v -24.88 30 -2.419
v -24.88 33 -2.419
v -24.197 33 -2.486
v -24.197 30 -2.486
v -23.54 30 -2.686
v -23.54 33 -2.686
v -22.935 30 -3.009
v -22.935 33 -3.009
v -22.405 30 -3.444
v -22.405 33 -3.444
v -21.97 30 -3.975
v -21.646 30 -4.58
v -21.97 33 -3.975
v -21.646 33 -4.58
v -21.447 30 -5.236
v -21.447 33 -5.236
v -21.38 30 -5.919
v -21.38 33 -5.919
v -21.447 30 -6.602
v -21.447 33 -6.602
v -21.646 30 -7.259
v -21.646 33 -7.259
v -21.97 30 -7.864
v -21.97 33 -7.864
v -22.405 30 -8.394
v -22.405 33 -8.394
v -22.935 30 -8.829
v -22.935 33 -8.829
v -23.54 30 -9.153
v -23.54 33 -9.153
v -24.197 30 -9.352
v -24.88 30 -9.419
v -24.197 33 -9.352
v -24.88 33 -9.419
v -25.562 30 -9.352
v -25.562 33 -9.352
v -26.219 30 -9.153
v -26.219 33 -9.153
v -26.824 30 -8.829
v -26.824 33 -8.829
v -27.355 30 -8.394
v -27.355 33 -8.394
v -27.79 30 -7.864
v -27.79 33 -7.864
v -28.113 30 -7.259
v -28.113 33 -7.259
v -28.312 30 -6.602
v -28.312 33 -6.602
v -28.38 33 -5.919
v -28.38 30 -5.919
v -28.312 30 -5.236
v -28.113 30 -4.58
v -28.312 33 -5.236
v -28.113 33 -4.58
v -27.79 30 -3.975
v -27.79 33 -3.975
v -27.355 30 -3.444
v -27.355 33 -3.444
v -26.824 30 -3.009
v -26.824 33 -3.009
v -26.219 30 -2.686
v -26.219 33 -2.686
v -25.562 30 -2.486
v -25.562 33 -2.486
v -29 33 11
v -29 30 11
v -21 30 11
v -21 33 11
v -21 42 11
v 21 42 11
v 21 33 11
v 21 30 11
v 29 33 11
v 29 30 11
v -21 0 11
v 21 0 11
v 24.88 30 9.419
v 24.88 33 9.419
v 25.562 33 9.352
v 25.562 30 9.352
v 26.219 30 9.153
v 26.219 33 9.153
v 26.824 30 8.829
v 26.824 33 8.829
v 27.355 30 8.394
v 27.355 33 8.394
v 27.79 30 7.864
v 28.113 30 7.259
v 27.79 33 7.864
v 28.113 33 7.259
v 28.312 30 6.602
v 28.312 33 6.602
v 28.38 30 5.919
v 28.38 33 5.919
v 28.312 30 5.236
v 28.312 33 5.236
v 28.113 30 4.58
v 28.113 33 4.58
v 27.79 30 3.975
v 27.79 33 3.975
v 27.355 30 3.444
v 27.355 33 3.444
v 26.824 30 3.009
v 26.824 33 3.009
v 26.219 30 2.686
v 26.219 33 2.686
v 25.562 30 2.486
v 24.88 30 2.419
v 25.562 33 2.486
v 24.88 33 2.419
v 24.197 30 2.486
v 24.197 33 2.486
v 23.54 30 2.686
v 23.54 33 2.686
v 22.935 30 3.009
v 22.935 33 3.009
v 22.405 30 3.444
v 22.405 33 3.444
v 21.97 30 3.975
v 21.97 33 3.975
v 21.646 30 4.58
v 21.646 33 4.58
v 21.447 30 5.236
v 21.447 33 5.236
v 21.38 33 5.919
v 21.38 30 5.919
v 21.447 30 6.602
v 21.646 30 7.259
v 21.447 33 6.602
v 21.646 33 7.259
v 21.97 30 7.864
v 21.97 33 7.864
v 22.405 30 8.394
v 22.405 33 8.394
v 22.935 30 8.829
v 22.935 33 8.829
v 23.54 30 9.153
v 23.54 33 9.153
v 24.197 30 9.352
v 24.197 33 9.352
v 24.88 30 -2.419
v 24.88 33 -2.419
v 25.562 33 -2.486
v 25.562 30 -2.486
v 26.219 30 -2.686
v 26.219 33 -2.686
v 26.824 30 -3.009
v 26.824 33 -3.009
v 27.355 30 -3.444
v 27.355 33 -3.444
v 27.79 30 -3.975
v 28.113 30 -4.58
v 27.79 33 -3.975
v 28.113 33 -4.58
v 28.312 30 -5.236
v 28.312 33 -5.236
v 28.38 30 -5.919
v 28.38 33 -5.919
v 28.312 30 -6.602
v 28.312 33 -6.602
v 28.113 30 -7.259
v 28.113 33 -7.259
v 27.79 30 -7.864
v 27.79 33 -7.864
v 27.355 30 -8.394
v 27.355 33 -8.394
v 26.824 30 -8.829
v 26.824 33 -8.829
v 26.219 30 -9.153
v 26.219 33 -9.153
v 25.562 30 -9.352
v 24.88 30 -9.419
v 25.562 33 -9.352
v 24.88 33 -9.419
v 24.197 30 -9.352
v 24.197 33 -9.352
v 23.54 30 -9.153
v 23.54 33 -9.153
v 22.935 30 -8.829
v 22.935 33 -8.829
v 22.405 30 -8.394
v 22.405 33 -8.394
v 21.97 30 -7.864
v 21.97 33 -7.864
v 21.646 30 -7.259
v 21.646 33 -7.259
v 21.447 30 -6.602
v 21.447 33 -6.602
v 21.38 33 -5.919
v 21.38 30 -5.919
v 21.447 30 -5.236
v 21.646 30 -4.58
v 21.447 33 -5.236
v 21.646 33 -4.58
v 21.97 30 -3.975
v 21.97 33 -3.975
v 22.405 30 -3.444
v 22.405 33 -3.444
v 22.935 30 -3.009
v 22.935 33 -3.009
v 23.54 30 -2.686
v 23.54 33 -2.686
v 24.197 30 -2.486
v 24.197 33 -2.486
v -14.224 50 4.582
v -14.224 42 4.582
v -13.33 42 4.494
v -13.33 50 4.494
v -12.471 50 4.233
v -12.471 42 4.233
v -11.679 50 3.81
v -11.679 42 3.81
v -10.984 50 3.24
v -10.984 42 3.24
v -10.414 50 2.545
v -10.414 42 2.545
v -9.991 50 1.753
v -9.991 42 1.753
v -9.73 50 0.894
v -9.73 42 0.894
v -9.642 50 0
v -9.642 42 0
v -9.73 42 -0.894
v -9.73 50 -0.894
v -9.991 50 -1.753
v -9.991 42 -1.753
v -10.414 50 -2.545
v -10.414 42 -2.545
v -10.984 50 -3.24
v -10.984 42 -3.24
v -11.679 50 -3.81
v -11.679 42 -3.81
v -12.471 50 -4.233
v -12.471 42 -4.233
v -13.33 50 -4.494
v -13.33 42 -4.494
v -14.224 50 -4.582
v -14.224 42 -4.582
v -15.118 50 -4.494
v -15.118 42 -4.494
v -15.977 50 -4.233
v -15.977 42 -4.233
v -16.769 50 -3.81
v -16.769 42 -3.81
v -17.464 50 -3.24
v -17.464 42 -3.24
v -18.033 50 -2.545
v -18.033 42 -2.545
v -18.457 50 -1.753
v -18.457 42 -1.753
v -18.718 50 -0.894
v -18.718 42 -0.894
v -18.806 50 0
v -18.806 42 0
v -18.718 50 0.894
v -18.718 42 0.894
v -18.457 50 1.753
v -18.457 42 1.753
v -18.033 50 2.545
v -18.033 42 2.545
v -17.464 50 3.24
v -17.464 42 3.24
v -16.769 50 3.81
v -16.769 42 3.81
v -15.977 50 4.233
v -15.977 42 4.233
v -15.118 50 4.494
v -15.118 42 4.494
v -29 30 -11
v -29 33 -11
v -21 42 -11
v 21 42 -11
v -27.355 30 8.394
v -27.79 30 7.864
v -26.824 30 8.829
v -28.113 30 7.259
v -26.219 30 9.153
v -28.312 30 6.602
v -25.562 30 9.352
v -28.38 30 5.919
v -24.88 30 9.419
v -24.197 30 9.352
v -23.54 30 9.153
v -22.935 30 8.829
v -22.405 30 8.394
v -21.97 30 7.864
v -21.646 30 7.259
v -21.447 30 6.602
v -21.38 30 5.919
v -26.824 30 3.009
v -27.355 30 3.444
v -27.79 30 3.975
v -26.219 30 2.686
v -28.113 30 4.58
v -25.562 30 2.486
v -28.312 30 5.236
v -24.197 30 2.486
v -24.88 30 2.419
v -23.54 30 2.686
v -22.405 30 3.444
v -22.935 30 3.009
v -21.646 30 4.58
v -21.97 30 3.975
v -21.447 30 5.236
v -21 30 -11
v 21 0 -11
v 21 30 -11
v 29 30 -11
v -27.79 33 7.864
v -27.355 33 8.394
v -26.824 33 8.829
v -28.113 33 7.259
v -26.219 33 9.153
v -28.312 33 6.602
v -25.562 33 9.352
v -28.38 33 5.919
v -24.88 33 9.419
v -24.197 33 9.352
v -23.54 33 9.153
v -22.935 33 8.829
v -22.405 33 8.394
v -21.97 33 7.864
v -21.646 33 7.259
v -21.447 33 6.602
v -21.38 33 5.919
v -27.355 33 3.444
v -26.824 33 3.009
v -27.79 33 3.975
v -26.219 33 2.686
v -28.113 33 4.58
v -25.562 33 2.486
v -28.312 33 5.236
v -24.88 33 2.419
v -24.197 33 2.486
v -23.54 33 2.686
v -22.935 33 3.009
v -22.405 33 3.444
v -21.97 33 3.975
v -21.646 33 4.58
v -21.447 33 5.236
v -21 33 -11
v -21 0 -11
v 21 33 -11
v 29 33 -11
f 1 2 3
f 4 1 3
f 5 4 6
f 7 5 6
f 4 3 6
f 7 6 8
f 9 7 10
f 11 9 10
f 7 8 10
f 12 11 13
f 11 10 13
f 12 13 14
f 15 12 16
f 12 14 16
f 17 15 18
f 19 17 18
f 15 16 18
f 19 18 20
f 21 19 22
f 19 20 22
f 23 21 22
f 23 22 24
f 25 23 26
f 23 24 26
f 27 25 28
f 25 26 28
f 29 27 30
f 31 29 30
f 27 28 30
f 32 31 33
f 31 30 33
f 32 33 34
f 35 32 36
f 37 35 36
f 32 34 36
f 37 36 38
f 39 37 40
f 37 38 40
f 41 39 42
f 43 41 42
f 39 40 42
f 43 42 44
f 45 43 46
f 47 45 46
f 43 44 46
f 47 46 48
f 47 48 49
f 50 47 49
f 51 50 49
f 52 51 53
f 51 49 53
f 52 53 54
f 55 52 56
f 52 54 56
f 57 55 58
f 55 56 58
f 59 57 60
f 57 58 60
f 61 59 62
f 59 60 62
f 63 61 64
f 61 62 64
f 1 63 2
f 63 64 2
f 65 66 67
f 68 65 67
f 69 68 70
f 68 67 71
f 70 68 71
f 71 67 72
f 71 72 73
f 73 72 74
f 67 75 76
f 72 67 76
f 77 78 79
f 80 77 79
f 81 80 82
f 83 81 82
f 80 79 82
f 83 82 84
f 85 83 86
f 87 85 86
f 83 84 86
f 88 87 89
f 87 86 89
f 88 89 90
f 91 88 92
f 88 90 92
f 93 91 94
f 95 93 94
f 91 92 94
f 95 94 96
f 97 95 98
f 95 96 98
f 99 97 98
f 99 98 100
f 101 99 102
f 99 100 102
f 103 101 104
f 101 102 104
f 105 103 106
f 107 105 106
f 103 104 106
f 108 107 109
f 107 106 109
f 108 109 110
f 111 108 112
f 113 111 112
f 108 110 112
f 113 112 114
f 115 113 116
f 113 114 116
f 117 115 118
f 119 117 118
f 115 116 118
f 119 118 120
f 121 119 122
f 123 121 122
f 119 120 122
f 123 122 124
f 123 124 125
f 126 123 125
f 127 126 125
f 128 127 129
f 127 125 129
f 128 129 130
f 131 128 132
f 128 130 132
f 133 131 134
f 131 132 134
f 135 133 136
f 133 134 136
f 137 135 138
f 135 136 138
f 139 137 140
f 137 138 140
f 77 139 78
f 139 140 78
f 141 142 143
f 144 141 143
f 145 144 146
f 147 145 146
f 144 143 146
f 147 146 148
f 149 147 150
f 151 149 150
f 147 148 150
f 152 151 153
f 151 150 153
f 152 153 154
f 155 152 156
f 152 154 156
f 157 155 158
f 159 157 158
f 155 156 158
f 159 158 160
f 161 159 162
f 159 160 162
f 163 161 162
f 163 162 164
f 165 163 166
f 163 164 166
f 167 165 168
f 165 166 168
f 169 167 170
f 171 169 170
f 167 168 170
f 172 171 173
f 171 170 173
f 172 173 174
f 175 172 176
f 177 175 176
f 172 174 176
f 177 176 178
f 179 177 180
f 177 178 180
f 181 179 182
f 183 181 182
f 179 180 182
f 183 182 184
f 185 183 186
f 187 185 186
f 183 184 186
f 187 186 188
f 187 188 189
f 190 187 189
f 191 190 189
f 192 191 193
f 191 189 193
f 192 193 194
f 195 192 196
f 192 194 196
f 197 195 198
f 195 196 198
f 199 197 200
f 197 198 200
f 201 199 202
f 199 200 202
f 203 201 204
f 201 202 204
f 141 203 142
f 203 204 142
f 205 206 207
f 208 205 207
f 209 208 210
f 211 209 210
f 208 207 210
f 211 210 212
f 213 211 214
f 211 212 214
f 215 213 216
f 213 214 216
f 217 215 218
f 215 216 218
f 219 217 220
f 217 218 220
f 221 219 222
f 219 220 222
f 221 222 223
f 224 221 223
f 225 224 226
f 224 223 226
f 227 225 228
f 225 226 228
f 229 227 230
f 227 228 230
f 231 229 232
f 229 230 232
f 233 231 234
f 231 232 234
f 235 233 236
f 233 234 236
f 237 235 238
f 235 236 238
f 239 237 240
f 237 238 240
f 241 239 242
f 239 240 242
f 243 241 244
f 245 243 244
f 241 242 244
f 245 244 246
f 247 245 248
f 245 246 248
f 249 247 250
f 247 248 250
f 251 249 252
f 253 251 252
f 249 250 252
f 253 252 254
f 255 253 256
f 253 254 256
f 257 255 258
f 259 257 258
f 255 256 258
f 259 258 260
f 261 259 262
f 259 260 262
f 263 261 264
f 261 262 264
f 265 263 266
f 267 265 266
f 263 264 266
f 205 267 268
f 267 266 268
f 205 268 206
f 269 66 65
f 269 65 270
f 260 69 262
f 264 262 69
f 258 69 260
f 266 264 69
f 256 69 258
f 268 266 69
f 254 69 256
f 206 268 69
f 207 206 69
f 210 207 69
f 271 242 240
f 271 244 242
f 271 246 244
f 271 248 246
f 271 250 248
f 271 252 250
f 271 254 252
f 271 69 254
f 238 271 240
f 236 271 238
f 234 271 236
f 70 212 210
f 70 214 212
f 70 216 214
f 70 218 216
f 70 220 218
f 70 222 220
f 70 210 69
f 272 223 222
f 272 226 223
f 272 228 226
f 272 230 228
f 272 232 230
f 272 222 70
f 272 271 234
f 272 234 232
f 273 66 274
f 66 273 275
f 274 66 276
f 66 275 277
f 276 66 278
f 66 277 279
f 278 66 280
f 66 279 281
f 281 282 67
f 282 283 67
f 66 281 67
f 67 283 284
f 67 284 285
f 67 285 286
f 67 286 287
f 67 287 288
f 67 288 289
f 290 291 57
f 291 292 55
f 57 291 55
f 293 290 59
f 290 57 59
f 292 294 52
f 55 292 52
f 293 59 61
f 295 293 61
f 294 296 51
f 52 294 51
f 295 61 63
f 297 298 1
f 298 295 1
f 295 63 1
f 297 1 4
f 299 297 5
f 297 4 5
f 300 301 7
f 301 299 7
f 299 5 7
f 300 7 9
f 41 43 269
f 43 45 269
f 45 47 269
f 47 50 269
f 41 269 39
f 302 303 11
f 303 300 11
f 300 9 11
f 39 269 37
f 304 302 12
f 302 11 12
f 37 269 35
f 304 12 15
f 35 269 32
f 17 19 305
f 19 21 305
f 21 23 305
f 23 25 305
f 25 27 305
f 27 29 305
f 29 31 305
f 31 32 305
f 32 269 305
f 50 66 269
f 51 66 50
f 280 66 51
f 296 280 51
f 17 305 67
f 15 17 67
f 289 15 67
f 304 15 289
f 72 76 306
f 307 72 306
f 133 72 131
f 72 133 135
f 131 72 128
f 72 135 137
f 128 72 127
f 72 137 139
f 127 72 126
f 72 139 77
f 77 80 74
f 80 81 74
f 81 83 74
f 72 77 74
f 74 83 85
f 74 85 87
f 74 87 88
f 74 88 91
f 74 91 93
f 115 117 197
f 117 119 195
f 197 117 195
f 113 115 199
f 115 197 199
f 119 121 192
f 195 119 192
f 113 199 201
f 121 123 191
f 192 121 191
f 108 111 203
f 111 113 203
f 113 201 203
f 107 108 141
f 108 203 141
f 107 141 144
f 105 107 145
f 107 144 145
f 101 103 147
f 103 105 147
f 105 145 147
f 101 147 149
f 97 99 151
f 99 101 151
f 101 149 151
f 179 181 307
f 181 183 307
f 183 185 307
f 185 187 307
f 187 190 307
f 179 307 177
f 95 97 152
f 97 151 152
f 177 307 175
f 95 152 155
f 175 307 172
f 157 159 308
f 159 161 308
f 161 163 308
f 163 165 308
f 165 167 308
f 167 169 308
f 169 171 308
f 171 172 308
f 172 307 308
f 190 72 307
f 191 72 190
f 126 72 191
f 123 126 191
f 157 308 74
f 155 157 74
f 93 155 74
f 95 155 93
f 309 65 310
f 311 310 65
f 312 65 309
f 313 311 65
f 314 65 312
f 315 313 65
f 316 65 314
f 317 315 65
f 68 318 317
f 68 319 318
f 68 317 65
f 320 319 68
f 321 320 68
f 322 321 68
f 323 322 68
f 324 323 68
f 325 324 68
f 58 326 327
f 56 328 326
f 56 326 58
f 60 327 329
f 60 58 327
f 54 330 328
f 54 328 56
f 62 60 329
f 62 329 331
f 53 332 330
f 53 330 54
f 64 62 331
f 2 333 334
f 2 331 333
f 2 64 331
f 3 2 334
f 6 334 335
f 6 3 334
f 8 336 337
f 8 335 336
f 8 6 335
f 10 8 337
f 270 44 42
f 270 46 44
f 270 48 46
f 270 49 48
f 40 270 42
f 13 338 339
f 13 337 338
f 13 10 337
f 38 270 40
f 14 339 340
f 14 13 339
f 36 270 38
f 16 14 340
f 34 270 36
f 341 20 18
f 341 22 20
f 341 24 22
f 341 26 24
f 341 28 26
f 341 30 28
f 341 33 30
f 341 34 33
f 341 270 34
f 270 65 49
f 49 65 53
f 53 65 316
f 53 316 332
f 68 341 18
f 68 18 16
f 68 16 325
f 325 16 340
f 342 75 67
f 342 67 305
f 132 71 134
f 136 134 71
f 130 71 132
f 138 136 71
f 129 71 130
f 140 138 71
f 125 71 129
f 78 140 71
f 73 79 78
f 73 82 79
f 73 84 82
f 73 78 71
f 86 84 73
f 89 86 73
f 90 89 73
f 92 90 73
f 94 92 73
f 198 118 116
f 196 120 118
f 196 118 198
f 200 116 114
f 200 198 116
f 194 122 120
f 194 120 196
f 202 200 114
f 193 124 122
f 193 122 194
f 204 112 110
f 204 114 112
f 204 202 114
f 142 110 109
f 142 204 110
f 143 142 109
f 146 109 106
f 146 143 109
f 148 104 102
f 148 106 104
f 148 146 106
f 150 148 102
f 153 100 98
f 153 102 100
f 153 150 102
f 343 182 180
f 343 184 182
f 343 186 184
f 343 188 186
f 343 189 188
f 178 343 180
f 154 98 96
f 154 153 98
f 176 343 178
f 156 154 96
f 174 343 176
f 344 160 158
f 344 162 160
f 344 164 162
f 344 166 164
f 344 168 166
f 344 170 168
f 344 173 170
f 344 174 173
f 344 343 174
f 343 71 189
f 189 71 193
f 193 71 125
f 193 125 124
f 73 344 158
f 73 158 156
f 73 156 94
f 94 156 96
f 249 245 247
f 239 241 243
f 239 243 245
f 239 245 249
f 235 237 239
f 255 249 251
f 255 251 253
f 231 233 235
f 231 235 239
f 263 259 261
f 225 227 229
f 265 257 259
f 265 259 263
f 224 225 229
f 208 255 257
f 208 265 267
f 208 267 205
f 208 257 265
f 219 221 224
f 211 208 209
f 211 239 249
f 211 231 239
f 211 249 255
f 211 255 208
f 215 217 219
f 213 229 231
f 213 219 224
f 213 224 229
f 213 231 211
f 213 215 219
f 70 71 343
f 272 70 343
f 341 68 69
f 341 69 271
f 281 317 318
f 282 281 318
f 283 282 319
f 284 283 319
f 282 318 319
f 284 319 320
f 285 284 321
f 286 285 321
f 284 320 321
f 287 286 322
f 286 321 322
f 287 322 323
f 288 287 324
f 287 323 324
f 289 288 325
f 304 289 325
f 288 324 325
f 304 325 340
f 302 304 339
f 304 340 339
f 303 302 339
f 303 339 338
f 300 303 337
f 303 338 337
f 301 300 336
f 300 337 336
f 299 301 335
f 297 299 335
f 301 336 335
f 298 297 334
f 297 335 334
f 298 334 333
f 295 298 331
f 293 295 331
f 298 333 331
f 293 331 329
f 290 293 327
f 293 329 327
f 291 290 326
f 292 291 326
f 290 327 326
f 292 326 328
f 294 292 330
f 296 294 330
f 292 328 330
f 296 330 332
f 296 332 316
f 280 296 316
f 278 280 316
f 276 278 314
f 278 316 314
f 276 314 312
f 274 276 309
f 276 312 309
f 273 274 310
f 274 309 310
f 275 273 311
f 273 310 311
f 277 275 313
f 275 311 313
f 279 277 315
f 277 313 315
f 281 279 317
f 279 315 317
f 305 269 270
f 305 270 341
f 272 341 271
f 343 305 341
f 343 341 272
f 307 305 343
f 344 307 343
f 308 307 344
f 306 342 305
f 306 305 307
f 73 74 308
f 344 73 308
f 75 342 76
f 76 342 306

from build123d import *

# Parameters (mm, degrees)
SKETCH_1_W          = 42
SKETCH_1_H          = 22
EXTRUDE_1_DEPTH     = 42
SKETCH_2_W          = 8
SKETCH_2_H          = 22
EXTRUDE_2_DEPTH     = 3
SKETCH_3_R          = 3.5
CUT_EXTRUDE_1_DEPTH = 3
SKETCH_4_R          = 4.581673227
EXTRUDE_3_DEPTH     = 8


with BuildPart() as part:
    # 草图1 → 凸台-拉伸1 (new body)
    with BuildSketch(Plane(origin=(0, 0, 0), x_dir=(1, 0, 0), z_dir=(0, 1, 0))):
        Rectangle(SKETCH_1_W, SKETCH_1_H)
    extrude(amount=EXTRUDE_1_DEPTH)

    # 草图2 → 凸台-拉伸2 (add)
    with BuildSketch(Plane(origin=(0, 30, 0), x_dir=(1, 0, 0), z_dir=(0, 1, 0))):
        with Locations((-25, 0)):
            Rectangle(SKETCH_2_W, SKETCH_2_H)
        with Locations((25, 0)):
            Rectangle(SKETCH_2_W, SKETCH_2_H)
    extrude(amount=EXTRUDE_2_DEPTH)

    # 草图3 → 切除-拉伸1 (cut)
    with BuildSketch(Plane(origin=(0, 33, 0), x_dir=(1, 0, 0), z_dir=(0, 1, 0))):
        with Locations(Location((-24.879659127, -5.919206434, 0), (0, 0, 270))):
            Circle(SKETCH_3_R)
        with Locations(Location((-24.879659127, 5.919206434, 0), (0, 0, 270))):
            Circle(SKETCH_3_R)
        with Locations(Location((24.879659127, 5.919206434, 0), (0, 0, 270))):
            Circle(SKETCH_3_R)
        with Locations(Location((24.879659127, -5.919206434, 0), (0, 0, 270))):
            Circle(SKETCH_3_R)
    extrude(amount=-CUT_EXTRUDE_1_DEPTH, mode=Mode.SUBTRACT)

    # 草图4 → 凸台-拉伸3 (add)
    with BuildSketch(Plane(origin=(0, 42, 0), x_dir=(1, 0, 0), z_dir=(0, 1, 0))):
        with Locations(Location((-14.223956567, 0, 0), (0, 0, 270))):
            Circle(SKETCH_4_R)
    extrude(amount=EXTRUDE_3_DEPTH)


solid = part.part
